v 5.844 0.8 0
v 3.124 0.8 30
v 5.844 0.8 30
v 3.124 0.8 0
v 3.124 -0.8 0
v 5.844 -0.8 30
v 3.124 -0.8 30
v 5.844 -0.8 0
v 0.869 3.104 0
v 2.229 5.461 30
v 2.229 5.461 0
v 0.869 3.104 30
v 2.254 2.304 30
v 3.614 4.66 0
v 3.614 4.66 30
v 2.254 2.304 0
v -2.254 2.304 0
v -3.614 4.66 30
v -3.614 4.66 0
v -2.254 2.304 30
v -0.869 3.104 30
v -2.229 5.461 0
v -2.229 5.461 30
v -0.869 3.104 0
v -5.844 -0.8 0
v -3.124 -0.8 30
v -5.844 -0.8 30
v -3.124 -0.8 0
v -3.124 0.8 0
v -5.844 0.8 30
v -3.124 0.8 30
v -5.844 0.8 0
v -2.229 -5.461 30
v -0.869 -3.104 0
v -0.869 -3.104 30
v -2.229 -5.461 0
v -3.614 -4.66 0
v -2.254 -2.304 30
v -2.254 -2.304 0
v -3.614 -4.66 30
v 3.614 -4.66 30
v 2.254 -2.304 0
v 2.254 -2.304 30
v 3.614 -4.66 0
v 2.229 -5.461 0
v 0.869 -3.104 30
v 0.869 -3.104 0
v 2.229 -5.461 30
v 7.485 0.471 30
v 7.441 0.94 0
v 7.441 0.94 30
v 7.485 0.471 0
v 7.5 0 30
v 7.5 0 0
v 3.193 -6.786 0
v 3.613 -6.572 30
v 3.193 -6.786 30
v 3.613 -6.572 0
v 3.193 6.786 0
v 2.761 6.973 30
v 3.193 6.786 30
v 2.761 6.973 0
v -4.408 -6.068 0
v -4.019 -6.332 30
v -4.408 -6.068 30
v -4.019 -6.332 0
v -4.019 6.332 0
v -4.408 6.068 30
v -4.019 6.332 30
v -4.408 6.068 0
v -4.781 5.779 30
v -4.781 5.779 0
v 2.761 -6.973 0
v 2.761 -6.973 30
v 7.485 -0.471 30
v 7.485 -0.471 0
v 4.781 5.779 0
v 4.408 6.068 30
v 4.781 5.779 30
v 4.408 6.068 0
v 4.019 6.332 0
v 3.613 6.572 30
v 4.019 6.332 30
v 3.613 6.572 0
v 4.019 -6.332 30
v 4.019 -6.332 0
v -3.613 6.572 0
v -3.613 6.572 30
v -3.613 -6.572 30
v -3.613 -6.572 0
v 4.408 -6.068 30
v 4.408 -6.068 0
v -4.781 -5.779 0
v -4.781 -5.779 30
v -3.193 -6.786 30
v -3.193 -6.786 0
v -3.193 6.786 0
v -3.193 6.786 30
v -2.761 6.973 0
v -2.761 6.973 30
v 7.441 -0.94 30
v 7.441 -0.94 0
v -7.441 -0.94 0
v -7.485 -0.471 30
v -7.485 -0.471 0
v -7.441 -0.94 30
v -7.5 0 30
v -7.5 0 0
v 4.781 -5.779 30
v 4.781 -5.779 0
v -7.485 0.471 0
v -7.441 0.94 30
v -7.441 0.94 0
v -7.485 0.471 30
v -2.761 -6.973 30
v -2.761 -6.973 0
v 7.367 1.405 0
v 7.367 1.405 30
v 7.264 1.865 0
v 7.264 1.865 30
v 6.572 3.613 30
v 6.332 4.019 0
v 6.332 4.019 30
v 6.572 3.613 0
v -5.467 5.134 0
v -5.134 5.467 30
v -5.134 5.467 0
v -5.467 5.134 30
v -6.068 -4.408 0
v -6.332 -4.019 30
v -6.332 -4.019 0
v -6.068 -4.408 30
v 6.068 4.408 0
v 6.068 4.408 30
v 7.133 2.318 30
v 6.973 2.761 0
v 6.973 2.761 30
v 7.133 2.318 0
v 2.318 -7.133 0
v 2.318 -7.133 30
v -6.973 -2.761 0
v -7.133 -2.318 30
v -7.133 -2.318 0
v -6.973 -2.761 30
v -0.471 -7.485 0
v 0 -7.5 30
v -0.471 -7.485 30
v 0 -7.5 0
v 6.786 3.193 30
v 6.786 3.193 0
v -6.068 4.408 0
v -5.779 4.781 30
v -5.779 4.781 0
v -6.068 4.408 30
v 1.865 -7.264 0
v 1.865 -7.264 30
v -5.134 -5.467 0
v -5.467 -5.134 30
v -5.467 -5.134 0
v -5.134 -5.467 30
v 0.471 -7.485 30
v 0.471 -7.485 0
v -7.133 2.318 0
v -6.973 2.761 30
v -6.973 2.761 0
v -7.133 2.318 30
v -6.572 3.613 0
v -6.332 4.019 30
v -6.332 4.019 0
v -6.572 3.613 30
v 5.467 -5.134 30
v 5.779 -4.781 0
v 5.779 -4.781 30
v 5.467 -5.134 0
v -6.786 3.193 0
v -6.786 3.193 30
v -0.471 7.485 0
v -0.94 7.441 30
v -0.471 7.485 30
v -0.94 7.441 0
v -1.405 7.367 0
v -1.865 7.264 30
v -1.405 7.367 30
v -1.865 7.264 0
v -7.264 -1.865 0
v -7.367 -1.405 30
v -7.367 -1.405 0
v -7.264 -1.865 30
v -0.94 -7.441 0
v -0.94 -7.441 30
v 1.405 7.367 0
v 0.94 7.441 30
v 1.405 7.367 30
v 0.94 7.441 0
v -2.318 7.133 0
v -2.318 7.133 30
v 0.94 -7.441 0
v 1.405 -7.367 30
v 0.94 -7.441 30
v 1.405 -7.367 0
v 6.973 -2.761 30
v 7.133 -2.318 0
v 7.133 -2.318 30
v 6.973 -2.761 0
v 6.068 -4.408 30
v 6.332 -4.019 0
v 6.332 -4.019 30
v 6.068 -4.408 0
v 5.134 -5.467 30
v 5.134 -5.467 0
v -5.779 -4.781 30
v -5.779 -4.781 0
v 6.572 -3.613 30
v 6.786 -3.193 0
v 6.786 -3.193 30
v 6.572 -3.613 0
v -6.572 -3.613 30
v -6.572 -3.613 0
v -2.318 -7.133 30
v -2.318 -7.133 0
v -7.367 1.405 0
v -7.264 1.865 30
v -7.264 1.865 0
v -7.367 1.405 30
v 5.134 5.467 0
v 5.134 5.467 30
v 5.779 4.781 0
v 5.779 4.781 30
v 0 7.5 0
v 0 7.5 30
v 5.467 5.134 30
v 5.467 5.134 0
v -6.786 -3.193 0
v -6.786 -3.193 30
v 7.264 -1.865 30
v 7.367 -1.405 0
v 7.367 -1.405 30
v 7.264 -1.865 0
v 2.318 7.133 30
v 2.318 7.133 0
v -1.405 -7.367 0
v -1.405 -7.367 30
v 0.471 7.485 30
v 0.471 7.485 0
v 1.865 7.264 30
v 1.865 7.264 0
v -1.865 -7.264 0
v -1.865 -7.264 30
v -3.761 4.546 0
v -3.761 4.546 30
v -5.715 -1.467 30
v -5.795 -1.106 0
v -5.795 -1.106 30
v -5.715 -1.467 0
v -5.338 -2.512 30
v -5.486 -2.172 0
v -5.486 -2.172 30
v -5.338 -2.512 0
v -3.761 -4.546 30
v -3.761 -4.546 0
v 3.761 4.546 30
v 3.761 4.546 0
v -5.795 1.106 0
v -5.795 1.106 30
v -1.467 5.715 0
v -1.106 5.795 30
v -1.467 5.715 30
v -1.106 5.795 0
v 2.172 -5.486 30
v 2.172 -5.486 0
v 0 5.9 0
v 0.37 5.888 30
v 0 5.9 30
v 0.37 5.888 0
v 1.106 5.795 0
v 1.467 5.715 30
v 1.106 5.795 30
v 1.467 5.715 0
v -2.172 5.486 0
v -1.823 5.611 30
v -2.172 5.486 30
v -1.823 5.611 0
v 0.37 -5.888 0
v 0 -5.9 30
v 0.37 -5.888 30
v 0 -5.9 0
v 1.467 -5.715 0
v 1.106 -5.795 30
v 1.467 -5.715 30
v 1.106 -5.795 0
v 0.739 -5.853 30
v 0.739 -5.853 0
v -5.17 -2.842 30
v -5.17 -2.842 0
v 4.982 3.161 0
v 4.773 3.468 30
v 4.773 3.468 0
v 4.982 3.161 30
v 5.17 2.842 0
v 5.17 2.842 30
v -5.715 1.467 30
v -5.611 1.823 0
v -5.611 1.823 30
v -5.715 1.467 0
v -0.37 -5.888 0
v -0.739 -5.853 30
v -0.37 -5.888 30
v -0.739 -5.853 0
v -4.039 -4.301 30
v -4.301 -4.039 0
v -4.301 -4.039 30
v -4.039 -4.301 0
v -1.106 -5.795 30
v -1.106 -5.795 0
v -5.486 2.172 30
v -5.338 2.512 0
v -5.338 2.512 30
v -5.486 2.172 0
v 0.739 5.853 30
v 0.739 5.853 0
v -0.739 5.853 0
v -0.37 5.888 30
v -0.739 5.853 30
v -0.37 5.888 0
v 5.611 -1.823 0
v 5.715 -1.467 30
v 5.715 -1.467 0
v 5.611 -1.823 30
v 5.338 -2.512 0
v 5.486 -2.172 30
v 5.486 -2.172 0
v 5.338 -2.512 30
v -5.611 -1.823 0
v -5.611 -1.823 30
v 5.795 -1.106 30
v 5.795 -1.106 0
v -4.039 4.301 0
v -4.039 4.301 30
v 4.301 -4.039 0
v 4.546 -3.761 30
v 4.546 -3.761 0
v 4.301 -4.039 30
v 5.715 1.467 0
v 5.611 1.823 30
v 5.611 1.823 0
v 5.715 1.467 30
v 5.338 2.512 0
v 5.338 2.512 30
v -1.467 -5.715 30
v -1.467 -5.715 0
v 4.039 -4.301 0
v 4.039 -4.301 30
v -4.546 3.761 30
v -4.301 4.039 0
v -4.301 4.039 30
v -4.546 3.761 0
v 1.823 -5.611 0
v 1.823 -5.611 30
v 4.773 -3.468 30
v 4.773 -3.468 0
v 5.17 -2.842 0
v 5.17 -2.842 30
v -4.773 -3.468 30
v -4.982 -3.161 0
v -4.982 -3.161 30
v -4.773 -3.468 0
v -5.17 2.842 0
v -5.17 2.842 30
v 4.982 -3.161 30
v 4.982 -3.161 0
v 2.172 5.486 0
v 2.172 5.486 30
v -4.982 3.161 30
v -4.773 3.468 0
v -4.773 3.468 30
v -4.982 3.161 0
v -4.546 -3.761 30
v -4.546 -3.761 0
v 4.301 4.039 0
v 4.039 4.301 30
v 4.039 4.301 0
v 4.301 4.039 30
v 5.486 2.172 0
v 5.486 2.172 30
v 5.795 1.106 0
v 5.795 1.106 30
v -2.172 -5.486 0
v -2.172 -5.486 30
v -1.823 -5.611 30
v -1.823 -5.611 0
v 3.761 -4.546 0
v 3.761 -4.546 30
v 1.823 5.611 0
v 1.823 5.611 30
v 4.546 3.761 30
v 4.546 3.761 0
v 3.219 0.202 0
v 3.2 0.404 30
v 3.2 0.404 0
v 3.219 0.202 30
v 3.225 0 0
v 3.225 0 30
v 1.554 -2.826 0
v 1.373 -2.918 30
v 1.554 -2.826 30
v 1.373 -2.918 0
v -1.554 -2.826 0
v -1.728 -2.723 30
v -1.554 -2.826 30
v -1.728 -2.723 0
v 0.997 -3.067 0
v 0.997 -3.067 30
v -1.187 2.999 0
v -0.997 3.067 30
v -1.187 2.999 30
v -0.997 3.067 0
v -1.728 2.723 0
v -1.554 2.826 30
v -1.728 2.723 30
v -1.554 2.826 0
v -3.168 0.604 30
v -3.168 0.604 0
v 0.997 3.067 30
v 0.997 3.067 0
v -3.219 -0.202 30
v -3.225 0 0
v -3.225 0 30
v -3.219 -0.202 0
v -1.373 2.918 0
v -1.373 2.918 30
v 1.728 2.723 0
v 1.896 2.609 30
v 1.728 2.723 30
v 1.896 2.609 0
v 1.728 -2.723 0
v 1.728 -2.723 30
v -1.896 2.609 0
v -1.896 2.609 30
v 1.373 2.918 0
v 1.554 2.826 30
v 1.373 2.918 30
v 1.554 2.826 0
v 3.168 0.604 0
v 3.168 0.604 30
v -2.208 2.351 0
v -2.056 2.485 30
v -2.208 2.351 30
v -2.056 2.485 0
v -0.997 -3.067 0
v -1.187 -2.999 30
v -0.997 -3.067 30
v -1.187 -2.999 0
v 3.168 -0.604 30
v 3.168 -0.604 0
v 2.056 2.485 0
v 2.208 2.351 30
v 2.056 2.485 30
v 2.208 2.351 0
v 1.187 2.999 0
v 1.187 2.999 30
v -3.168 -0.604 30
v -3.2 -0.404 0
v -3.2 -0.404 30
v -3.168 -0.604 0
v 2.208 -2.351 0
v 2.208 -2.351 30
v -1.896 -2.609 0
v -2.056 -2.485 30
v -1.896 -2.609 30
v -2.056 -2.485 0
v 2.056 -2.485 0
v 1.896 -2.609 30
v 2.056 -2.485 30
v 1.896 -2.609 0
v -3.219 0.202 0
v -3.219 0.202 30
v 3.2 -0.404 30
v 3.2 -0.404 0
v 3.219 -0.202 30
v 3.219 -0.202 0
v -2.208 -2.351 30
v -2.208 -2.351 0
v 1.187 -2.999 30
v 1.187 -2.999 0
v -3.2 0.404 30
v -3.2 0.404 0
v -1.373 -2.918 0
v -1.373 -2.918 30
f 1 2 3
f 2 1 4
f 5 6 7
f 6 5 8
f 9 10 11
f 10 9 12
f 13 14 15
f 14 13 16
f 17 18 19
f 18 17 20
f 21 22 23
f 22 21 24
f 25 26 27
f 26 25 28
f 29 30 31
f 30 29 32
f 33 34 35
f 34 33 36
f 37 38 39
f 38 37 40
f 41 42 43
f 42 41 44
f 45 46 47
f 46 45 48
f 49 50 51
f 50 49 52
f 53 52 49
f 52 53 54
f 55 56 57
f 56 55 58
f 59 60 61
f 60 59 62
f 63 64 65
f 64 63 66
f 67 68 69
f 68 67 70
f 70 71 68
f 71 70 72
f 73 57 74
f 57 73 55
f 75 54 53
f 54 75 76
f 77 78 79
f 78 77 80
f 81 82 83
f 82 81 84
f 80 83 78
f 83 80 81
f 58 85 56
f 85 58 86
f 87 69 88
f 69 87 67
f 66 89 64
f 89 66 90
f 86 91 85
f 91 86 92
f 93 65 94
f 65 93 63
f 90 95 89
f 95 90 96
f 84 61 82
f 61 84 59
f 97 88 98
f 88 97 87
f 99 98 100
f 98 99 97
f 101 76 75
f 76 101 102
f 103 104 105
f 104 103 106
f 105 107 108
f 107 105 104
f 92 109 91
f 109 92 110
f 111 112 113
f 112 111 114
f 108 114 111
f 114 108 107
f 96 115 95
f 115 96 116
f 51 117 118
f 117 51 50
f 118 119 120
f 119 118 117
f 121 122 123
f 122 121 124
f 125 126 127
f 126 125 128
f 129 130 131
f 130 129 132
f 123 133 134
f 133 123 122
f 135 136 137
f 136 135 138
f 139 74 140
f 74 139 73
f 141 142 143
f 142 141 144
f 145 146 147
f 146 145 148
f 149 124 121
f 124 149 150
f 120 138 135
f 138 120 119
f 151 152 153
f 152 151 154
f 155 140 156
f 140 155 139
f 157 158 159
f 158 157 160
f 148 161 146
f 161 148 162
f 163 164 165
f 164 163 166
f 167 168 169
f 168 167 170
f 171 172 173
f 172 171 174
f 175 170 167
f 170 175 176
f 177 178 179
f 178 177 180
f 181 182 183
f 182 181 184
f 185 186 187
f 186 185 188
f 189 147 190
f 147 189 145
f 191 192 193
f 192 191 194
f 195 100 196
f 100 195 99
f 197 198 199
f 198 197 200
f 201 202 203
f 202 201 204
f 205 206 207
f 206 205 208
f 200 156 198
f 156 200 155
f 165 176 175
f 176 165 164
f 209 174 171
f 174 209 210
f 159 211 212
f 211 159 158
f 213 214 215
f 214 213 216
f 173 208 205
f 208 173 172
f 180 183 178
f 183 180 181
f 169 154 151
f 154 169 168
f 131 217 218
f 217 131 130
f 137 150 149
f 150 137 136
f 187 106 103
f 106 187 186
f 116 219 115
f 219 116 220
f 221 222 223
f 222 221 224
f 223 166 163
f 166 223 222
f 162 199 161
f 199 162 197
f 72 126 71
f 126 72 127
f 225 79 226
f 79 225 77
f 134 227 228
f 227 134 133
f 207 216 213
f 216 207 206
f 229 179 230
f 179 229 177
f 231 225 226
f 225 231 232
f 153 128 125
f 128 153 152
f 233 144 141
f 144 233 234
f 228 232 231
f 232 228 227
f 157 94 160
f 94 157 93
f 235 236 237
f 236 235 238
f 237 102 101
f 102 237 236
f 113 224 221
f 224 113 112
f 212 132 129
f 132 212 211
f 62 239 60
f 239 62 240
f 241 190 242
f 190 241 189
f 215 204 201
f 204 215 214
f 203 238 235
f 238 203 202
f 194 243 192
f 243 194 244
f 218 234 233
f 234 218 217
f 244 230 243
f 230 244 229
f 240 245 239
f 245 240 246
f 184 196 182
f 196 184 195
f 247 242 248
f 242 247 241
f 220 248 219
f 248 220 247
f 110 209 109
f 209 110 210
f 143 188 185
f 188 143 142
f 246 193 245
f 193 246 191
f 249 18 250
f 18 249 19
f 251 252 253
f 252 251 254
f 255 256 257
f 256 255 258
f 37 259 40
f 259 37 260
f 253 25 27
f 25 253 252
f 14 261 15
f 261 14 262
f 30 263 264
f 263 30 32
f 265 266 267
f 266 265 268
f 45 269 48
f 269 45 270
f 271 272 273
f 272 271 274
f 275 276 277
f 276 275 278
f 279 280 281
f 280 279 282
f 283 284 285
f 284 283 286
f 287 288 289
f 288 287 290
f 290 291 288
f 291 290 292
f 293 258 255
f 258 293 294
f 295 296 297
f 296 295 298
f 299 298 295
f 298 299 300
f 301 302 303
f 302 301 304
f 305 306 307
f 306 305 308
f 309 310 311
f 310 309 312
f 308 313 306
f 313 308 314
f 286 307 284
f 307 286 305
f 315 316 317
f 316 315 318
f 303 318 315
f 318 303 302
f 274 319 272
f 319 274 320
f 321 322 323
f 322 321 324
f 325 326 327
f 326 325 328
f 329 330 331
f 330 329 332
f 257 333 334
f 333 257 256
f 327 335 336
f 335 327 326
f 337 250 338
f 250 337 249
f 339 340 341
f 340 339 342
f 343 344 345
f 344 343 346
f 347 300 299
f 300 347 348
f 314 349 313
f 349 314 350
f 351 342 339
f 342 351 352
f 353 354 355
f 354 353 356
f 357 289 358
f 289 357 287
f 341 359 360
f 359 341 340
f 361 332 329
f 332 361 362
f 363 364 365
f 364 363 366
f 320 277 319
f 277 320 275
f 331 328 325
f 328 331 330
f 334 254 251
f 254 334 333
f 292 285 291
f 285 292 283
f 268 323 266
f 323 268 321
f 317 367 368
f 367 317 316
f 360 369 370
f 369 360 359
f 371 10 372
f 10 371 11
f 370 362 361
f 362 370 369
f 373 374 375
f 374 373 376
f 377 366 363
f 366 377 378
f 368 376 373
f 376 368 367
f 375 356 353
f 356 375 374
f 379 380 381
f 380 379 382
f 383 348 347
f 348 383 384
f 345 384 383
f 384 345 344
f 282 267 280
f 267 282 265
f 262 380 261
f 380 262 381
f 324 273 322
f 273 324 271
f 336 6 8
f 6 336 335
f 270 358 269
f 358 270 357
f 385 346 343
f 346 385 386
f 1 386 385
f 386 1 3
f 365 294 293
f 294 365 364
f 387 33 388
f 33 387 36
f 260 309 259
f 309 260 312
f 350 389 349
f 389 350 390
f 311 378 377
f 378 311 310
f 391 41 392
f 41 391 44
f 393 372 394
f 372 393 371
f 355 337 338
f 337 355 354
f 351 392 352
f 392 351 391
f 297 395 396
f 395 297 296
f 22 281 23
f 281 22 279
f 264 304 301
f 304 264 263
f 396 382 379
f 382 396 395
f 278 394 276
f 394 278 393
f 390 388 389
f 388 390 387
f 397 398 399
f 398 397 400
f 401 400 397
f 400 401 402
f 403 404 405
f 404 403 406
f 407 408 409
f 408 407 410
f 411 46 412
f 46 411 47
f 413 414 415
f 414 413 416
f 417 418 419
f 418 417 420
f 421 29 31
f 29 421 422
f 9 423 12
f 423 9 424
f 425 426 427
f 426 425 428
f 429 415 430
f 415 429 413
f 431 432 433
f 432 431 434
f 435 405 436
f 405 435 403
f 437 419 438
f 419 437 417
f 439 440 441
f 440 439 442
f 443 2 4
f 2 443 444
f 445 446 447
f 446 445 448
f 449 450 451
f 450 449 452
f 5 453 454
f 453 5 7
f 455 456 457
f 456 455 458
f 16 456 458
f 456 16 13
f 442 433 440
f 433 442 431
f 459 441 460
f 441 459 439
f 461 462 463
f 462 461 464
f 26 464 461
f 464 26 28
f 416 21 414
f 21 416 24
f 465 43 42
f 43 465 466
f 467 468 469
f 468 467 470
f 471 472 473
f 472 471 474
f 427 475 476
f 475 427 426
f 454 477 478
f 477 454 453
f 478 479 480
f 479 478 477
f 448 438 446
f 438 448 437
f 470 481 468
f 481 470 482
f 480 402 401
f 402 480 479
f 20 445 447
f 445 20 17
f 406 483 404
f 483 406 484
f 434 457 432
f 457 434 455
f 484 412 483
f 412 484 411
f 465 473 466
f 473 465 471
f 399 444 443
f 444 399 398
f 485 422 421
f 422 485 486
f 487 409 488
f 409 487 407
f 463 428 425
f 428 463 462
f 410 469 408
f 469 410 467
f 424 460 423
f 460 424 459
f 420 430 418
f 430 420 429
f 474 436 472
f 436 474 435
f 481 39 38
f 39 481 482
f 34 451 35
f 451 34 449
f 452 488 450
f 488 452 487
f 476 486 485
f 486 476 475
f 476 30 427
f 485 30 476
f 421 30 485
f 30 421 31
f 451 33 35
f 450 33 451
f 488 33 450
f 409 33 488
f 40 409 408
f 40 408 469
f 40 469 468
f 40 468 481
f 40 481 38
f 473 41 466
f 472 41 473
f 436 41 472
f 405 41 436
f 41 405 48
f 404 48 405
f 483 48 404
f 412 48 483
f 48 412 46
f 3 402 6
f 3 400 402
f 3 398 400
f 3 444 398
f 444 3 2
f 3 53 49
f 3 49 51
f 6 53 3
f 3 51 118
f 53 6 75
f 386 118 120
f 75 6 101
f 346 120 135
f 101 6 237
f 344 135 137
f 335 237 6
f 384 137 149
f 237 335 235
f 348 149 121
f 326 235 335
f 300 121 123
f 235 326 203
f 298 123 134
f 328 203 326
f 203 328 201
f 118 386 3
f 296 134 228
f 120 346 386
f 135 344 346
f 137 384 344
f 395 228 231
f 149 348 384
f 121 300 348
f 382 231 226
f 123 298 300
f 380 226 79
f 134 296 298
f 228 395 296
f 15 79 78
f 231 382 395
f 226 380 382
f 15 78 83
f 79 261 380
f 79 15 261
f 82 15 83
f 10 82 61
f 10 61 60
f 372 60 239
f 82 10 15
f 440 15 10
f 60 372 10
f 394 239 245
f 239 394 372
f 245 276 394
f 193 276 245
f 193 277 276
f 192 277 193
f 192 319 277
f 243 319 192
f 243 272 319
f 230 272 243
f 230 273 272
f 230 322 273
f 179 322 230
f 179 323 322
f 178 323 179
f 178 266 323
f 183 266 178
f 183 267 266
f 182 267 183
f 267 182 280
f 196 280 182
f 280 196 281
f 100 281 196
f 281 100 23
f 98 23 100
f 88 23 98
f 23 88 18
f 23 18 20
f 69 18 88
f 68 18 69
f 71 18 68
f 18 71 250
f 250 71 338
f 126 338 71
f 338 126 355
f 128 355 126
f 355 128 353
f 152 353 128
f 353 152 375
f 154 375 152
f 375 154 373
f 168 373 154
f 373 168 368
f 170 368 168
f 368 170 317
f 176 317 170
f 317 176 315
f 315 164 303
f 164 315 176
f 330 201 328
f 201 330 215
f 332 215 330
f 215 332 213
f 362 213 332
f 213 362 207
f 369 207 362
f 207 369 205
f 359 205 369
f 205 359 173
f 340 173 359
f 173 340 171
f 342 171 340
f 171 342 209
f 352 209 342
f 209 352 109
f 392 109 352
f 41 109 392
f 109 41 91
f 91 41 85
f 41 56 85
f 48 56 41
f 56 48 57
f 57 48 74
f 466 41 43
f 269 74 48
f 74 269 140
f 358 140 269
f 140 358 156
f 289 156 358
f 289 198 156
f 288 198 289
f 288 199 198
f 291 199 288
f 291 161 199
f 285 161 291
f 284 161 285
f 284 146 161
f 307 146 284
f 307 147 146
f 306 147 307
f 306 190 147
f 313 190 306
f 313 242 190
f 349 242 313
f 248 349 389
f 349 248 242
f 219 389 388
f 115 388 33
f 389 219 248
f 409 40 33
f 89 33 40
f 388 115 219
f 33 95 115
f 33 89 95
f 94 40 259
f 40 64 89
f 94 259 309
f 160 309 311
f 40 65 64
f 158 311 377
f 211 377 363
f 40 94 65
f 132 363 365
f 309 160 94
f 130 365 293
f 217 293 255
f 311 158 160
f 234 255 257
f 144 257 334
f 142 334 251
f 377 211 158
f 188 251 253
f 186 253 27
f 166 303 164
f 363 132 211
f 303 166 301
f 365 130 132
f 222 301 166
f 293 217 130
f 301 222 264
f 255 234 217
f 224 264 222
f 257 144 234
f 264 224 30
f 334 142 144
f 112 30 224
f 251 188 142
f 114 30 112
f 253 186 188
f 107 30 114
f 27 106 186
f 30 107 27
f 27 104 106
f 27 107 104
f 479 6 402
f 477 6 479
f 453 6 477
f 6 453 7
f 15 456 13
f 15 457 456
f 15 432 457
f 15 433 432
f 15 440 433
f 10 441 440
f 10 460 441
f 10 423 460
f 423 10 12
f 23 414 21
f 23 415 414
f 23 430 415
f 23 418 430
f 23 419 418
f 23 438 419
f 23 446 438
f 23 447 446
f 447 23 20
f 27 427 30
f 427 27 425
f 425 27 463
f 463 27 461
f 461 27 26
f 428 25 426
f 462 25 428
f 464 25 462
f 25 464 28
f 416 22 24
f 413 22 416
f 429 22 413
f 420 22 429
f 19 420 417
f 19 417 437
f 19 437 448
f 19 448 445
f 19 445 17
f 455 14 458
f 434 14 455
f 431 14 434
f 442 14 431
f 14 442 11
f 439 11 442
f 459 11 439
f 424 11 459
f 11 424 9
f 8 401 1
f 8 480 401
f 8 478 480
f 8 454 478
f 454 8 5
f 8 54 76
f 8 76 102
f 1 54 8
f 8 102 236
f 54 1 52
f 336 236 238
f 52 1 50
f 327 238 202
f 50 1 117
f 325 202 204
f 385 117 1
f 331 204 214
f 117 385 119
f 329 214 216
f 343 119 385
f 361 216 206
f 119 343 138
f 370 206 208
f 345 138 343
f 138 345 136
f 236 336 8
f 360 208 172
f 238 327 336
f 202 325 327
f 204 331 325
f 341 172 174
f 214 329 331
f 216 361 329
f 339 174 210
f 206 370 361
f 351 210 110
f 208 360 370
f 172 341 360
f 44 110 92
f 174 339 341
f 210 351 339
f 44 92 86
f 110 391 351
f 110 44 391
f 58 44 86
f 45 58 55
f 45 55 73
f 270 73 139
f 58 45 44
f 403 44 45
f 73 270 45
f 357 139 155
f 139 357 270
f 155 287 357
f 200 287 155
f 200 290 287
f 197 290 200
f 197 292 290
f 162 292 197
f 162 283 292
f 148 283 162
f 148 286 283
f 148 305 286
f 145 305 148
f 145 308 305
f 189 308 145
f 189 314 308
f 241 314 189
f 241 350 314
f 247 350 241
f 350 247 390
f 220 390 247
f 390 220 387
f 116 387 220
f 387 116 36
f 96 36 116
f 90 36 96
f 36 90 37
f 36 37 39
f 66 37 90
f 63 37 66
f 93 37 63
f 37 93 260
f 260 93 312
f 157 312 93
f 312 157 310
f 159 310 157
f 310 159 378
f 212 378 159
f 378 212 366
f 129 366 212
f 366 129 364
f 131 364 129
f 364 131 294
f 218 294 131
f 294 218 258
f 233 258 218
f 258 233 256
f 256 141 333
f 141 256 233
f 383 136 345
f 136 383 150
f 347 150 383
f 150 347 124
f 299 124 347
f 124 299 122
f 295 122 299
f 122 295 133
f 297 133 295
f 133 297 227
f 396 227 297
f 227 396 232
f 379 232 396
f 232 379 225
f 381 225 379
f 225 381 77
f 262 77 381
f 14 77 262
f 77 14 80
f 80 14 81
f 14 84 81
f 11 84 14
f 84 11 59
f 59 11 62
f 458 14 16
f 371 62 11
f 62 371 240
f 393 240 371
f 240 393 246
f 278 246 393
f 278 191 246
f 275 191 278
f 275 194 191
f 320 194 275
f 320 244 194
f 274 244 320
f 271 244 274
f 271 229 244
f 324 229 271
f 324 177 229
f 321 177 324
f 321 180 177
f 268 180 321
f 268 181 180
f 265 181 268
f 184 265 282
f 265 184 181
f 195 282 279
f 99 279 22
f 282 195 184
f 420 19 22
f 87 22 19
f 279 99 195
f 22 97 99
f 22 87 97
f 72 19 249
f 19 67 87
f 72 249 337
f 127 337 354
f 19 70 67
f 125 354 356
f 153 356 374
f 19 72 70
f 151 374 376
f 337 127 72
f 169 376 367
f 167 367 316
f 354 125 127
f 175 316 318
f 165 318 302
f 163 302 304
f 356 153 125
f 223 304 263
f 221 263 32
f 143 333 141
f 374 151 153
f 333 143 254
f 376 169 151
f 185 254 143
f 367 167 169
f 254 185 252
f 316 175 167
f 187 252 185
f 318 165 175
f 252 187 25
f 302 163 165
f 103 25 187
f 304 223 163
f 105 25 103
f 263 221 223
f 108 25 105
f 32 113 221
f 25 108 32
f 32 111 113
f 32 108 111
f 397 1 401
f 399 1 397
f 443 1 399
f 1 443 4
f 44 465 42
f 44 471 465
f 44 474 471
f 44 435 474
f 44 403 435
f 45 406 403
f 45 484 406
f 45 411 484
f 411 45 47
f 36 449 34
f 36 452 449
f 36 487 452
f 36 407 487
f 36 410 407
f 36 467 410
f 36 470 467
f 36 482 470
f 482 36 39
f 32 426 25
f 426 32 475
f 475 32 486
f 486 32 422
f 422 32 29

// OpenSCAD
 /*
 * Customizable Linear Bushing - https://www.thingiverse.com/thing:2202854
 * by Dennis Hofmann - https://www.thingiverse.com/mightynozzle/about
 * created 2017-03-25
 * updated 2018-02-15
 * version v1.8
 *
 * Changelog
 * --------------
 * v1.8:
 *      - groove option added
 * v1.7:
 *      - fixed inner diameter
 * v1.6:
 *      - added chamfer angle option
 * v1.5:
 *      - fixed graphic glitch
 * v1.4:
 *      - added chamfer option
 *
 * v1.1-1.3:
 *      - initial model with minor changes in description
 *
 * --------------
 * 
 * This work is licensed under the Creative Commons - Attribution - Non-Commercial license.
 * https://creativecommons.org/licenses/by-nc/3.0/
 */
 
 // Parameter Section //
//-------------------//

/* [Bushing Settings] */

// Equals dr in technical diagrams. Use the outer diameter of the rod + tolerance value of your printer. Do some test prints before print a whole set of bushings. Best way in my case is to choose the bushing where can push it in with some effort on the rod and slide it by hand without any tools. Then slide it back and forth along the rod, until the bushing has the expected behavior. I suggest you not to use any drill or heat. The sliding of the bushing generates enough heat from its friction against the rod. Standard values: 6.00 for LM6(L)UU, 8.00 (default 8.15) for LM8(L)UU, 10.00 for LM10(L)UU, 12.00 for LM12(L)UU, 16.00 for LM16UU, ...
inner_diameter_in_millimeter = 6.45;

// Equals D in technical diagrams. Use the inner diameter of housing where the bushing sits + tolerance value of your printer. Depends on the filament you use and the total wall thickness of the bushings, the bushing shouldn't fit to tight in the housing. Standard values: 12.0 for LM6(L)UU, 15.0 (default) for LM8(L)UU, 19.0 for LM10(L)UU, 21.0 for LM12(L)UU, 28.0 for LM16UU, ...
outer_diameter_in_millimeter = 15.0; 

// Equals L in technical diagrams. Standard values: 19.0 for LM6UU, 24.0 for LM8UU, 29.0 for LM10UU, 30.0 for LM12UU, 35.0 for LM6LUU, 37.0 for LM16UU, 45.0 for LM8LUU, 55.0 for LM10LUU, 57.0 for LM12LUU, ...
bushing_length_in_millimeter = 20.0;

// Use a value to get straight primeters without any zigzag between the outer and inner perimeter. I use the value of 0.48 for 0.4 nozzle. This is the auto extrusion width of 0.48 of simplify3d. More information about this in the description of this design on thingiverse.
extrusion_width_in_millimeter = 0.40; 

// Use even numbers. E.g. 4 for LM8(L)UU. Don't forget to set the perimeter number in your Slicer! 
number_of_perimeters = 4; //[2:2:10]

// Choose a number to provide a gap between the teeth in the bushing. E.g. 8 or 10 for LM8(L)UU. The tooth width depends on the extrusion_width_in_millimeter and the number_of_perimeters.
number_of_teeth = 6; //[3:20]

// Radius of the chamfer. Set a chamfer if you want to insert the rod easier. This also helps if your prints tends to create elephant foot in the first few layers. A value between 0.3 and 1.0 might be a good value. Set a value above 0 might destroy the preview of the bushing. But the resulting stl-File will be correct.
chamfer_radius_in_millimeter = 0.0;

// Set the angle of the chamfer. 
chamfer_angle_in_degree = 55.0; // [30:75]

// Equals W in technical diagram. 1.1 for LM6/8(L)UU, 1.3 for LM10/12/13(L)UU, 1.6 for LM16/20(L)UU, 1.85 for LM25/30(L)UU, 2.1 for LM35/40(L)UU, 2.6 for LM50(L)UU, 3.15 for LM60(L)UU
groove_length_in_millimeter = 0;

// Equals D1 in technical diagram. 11.5 for LM6(L)UU, 14.3 for LM8(L)UU, 18.0 for LM10(L)UU, 20.0 for LM12(L)UU, 22.0 for LM13(L)UU, 27.0 for LM16(L)UU, 30.5 for LM20(L)UU, 38.0 for LM25(L)UU, 43.0 for LM30(L)UU, 49.0 for LM35(L)UU, 57.0 for LM40(L)UU, 76.5 for LM50(L)UU, 86.5 for LM60(L)UU
groove_diameter_in_millimeter = 0;

// Equals B in technical diagram. Outer distance between both grooves. 13.5 for LM6UU, 17.5 for LM8UU, 22.0 for LM10UU, 23.0 for LM12UU, 26.5 for LM16UU, 27.0 for LM6LUU, 35.0 for LM8UU, 44.0 for LM10LUU, 46.0 for LM12LUU, 53.0 for LM16LUU
groove_distance_in_millimeter = 0;

/* [Hidden] */
inner_dia = inner_diameter_in_millimeter;
outer_dia = outer_diameter_in_millimeter;
$bushing_l = bushing_length_in_millimeter;
extrusion_w = extrusion_width_in_millimeter;
perimeters = number_of_perimeters;
teeth = number_of_teeth;
chamfer_r = chamfer_radius_in_millimeter;
chamfer_h = tan(chamfer_angle_in_degree) * chamfer_r;
groove_l = groove_length_in_millimeter;
groove_dia = groove_diameter_in_millimeter;
groove_d = groove_distance_in_millimeter;


$fn=100;

 // Program Section //
//-----------------//

module bushing(len = 20) {
    let ($bushing_l = len) {
        difference() {
            bushing1();
            if(chamfer_r > 0) {
                chamfer_cut();
                translate([0, 0, $bushing_l]) {
                    rotate([180,0,0]) {
                        chamfer_cut();
                    }
                }
            }
            groove_cut();
        }
    };
}

bushing(30);

 // Module Section //
//----------------//

module bushing1() {
    translate([0, 0, $bushing_l / 2]) {
        difference() {
            union() {
                difference() {
                    for(tooth = [0 : teeth - 1])
                        rotate([0, 0, 360 / teeth * tooth]) {
                            translate([outer_dia / 4, 0, 0]) {
                                cube([outer_dia / 2, extrusion_w * perimeters, $bushing_l + 1], center = true);
                            }
                        }
                        translate([0, 0, -$bushing_l / 2-1]) {
                            ring(outer_dia * 2, outer_dia, $bushing_l + 2);
                        }
                    }
                    translate([0, 0, -$bushing_l / 2 - 1]) {
                        ring(outer_dia, outer_dia - extrusion_w * perimeters * 2, $bushing_l + 2);
                    }
            }
            cylinder(d = inner_dia, h = $bushing_l + 2, center = true);
            translate([0, 0, $bushing_l / 2]) {
                cylinder(d = outer_dia + 1, h = 2, $f = 16);
            }
            translate([0, 0, -($bushing_l / 2 + 2)]) {
                cylinder(d = outer_dia + 1, h = 2, $f = 16);
            }
        }
    }
}

module ring(d1, d2, height) {
    difference() {
        cylinder(d = d1, h = height, center = false);
        cylinder(d = d2, h = height, center = false);
    }
}

module chamfer_cut() {
    union() {
        difference() {
            translate([0, 0, -1]) {
                cylinder(d = outer_dia + 1, h = chamfer_h + 1);
            }
            intersection() {
                cylinder(d = outer_dia, h = chamfer_h);
                cylinder(d1 = outer_dia - chamfer_r * 2, d2 = outer_dia, h = chamfer_h);
            }
        }
        translate([0, 0, -chamfer_h]) {
            intersection() {
                cylinder(d = inner_dia + chamfer_r * 4, h = chamfer_h * 2);
                cylinder(d1 = inner_dia + chamfer_r * 4, d2 = inner_dia, h = chamfer_h * 2);
            }
        }
        translate([0, 0, -10]) {
            cylinder(d = outer_dia + 1, h = 10);
        }
    }
}

module groove_cut() {
    translate([0, 0, $bushing_l / 2 - groove_d / 2]) {
        ring(outer_dia + 1, groove_dia, groove_l);
    }
    translate([0, 0, $bushing_l - (($bushing_l / 2) - (groove_d / 2) + groove_l)]) {
        ring(outer_dia + 1, groove_dia, groove_l);
    }
}
